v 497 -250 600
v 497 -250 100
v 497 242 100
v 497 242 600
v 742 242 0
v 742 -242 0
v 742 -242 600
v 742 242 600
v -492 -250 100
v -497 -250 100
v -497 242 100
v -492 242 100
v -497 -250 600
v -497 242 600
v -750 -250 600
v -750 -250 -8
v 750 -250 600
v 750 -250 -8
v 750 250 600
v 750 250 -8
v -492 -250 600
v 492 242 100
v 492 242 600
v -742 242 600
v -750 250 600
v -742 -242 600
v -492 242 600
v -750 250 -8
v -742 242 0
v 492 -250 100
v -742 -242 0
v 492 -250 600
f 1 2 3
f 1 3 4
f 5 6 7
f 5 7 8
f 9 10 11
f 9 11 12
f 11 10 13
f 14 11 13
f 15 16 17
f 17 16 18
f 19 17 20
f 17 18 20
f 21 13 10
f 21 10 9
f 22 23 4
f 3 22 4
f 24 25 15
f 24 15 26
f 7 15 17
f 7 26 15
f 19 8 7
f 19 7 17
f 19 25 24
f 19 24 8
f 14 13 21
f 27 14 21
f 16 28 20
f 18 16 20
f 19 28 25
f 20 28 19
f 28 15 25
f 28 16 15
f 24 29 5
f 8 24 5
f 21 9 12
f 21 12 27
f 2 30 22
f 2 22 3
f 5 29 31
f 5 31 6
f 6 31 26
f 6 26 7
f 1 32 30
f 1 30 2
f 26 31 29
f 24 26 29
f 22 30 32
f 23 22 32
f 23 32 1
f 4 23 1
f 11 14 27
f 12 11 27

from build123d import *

# Parameters (mm, degrees)
F0_W     = 1500
F0_H     = 500
F0_W_2   = 1484
F0_H_2   = 484
F1_DEPTH = 8
F2_DEPTH = 600
F4_W     = 5
F4_H     = 500
F5_DEPTH = 492


with BuildPart() as f1:
    # F0 (on Top) → F1 (new body)
    with BuildSketch(Plane.XY):
        Rectangle(F0_W, F0_H)
        Rectangle(F0_W_2, F0_H_2, mode=Mode.SUBTRACT)
        Rectangle(F0_W_2, F0_H_2)
    extrude(amount=-F1_DEPTH)


with BuildPart() as f2:
    # F0 (on Top) → F2 (new body)
    with BuildSketch(Plane.XY):
        Rectangle(F0_W, F0_H)
        Rectangle(F0_W_2, F0_H_2, mode=Mode.SUBTRACT)
    extrude(amount=F2_DEPTH)


with BuildPart() as f1_1:
    add(f1.part)

    # F3: union F2
    add(f2.part)


with BuildPart() as f5:
    # F4 (on face) → F5 (new body, through all)
    with BuildSketch(Plane.XZ.offset(250)):
        with Locations((-494.5, 350)):
            Rectangle(F4_W, F4_H)
        with Locations((494.5, 350)):
            Rectangle(F4_W, F4_H)
    extrude(amount=-F5_DEPTH)


solid = Compound([f1_1.part, f5.part])
